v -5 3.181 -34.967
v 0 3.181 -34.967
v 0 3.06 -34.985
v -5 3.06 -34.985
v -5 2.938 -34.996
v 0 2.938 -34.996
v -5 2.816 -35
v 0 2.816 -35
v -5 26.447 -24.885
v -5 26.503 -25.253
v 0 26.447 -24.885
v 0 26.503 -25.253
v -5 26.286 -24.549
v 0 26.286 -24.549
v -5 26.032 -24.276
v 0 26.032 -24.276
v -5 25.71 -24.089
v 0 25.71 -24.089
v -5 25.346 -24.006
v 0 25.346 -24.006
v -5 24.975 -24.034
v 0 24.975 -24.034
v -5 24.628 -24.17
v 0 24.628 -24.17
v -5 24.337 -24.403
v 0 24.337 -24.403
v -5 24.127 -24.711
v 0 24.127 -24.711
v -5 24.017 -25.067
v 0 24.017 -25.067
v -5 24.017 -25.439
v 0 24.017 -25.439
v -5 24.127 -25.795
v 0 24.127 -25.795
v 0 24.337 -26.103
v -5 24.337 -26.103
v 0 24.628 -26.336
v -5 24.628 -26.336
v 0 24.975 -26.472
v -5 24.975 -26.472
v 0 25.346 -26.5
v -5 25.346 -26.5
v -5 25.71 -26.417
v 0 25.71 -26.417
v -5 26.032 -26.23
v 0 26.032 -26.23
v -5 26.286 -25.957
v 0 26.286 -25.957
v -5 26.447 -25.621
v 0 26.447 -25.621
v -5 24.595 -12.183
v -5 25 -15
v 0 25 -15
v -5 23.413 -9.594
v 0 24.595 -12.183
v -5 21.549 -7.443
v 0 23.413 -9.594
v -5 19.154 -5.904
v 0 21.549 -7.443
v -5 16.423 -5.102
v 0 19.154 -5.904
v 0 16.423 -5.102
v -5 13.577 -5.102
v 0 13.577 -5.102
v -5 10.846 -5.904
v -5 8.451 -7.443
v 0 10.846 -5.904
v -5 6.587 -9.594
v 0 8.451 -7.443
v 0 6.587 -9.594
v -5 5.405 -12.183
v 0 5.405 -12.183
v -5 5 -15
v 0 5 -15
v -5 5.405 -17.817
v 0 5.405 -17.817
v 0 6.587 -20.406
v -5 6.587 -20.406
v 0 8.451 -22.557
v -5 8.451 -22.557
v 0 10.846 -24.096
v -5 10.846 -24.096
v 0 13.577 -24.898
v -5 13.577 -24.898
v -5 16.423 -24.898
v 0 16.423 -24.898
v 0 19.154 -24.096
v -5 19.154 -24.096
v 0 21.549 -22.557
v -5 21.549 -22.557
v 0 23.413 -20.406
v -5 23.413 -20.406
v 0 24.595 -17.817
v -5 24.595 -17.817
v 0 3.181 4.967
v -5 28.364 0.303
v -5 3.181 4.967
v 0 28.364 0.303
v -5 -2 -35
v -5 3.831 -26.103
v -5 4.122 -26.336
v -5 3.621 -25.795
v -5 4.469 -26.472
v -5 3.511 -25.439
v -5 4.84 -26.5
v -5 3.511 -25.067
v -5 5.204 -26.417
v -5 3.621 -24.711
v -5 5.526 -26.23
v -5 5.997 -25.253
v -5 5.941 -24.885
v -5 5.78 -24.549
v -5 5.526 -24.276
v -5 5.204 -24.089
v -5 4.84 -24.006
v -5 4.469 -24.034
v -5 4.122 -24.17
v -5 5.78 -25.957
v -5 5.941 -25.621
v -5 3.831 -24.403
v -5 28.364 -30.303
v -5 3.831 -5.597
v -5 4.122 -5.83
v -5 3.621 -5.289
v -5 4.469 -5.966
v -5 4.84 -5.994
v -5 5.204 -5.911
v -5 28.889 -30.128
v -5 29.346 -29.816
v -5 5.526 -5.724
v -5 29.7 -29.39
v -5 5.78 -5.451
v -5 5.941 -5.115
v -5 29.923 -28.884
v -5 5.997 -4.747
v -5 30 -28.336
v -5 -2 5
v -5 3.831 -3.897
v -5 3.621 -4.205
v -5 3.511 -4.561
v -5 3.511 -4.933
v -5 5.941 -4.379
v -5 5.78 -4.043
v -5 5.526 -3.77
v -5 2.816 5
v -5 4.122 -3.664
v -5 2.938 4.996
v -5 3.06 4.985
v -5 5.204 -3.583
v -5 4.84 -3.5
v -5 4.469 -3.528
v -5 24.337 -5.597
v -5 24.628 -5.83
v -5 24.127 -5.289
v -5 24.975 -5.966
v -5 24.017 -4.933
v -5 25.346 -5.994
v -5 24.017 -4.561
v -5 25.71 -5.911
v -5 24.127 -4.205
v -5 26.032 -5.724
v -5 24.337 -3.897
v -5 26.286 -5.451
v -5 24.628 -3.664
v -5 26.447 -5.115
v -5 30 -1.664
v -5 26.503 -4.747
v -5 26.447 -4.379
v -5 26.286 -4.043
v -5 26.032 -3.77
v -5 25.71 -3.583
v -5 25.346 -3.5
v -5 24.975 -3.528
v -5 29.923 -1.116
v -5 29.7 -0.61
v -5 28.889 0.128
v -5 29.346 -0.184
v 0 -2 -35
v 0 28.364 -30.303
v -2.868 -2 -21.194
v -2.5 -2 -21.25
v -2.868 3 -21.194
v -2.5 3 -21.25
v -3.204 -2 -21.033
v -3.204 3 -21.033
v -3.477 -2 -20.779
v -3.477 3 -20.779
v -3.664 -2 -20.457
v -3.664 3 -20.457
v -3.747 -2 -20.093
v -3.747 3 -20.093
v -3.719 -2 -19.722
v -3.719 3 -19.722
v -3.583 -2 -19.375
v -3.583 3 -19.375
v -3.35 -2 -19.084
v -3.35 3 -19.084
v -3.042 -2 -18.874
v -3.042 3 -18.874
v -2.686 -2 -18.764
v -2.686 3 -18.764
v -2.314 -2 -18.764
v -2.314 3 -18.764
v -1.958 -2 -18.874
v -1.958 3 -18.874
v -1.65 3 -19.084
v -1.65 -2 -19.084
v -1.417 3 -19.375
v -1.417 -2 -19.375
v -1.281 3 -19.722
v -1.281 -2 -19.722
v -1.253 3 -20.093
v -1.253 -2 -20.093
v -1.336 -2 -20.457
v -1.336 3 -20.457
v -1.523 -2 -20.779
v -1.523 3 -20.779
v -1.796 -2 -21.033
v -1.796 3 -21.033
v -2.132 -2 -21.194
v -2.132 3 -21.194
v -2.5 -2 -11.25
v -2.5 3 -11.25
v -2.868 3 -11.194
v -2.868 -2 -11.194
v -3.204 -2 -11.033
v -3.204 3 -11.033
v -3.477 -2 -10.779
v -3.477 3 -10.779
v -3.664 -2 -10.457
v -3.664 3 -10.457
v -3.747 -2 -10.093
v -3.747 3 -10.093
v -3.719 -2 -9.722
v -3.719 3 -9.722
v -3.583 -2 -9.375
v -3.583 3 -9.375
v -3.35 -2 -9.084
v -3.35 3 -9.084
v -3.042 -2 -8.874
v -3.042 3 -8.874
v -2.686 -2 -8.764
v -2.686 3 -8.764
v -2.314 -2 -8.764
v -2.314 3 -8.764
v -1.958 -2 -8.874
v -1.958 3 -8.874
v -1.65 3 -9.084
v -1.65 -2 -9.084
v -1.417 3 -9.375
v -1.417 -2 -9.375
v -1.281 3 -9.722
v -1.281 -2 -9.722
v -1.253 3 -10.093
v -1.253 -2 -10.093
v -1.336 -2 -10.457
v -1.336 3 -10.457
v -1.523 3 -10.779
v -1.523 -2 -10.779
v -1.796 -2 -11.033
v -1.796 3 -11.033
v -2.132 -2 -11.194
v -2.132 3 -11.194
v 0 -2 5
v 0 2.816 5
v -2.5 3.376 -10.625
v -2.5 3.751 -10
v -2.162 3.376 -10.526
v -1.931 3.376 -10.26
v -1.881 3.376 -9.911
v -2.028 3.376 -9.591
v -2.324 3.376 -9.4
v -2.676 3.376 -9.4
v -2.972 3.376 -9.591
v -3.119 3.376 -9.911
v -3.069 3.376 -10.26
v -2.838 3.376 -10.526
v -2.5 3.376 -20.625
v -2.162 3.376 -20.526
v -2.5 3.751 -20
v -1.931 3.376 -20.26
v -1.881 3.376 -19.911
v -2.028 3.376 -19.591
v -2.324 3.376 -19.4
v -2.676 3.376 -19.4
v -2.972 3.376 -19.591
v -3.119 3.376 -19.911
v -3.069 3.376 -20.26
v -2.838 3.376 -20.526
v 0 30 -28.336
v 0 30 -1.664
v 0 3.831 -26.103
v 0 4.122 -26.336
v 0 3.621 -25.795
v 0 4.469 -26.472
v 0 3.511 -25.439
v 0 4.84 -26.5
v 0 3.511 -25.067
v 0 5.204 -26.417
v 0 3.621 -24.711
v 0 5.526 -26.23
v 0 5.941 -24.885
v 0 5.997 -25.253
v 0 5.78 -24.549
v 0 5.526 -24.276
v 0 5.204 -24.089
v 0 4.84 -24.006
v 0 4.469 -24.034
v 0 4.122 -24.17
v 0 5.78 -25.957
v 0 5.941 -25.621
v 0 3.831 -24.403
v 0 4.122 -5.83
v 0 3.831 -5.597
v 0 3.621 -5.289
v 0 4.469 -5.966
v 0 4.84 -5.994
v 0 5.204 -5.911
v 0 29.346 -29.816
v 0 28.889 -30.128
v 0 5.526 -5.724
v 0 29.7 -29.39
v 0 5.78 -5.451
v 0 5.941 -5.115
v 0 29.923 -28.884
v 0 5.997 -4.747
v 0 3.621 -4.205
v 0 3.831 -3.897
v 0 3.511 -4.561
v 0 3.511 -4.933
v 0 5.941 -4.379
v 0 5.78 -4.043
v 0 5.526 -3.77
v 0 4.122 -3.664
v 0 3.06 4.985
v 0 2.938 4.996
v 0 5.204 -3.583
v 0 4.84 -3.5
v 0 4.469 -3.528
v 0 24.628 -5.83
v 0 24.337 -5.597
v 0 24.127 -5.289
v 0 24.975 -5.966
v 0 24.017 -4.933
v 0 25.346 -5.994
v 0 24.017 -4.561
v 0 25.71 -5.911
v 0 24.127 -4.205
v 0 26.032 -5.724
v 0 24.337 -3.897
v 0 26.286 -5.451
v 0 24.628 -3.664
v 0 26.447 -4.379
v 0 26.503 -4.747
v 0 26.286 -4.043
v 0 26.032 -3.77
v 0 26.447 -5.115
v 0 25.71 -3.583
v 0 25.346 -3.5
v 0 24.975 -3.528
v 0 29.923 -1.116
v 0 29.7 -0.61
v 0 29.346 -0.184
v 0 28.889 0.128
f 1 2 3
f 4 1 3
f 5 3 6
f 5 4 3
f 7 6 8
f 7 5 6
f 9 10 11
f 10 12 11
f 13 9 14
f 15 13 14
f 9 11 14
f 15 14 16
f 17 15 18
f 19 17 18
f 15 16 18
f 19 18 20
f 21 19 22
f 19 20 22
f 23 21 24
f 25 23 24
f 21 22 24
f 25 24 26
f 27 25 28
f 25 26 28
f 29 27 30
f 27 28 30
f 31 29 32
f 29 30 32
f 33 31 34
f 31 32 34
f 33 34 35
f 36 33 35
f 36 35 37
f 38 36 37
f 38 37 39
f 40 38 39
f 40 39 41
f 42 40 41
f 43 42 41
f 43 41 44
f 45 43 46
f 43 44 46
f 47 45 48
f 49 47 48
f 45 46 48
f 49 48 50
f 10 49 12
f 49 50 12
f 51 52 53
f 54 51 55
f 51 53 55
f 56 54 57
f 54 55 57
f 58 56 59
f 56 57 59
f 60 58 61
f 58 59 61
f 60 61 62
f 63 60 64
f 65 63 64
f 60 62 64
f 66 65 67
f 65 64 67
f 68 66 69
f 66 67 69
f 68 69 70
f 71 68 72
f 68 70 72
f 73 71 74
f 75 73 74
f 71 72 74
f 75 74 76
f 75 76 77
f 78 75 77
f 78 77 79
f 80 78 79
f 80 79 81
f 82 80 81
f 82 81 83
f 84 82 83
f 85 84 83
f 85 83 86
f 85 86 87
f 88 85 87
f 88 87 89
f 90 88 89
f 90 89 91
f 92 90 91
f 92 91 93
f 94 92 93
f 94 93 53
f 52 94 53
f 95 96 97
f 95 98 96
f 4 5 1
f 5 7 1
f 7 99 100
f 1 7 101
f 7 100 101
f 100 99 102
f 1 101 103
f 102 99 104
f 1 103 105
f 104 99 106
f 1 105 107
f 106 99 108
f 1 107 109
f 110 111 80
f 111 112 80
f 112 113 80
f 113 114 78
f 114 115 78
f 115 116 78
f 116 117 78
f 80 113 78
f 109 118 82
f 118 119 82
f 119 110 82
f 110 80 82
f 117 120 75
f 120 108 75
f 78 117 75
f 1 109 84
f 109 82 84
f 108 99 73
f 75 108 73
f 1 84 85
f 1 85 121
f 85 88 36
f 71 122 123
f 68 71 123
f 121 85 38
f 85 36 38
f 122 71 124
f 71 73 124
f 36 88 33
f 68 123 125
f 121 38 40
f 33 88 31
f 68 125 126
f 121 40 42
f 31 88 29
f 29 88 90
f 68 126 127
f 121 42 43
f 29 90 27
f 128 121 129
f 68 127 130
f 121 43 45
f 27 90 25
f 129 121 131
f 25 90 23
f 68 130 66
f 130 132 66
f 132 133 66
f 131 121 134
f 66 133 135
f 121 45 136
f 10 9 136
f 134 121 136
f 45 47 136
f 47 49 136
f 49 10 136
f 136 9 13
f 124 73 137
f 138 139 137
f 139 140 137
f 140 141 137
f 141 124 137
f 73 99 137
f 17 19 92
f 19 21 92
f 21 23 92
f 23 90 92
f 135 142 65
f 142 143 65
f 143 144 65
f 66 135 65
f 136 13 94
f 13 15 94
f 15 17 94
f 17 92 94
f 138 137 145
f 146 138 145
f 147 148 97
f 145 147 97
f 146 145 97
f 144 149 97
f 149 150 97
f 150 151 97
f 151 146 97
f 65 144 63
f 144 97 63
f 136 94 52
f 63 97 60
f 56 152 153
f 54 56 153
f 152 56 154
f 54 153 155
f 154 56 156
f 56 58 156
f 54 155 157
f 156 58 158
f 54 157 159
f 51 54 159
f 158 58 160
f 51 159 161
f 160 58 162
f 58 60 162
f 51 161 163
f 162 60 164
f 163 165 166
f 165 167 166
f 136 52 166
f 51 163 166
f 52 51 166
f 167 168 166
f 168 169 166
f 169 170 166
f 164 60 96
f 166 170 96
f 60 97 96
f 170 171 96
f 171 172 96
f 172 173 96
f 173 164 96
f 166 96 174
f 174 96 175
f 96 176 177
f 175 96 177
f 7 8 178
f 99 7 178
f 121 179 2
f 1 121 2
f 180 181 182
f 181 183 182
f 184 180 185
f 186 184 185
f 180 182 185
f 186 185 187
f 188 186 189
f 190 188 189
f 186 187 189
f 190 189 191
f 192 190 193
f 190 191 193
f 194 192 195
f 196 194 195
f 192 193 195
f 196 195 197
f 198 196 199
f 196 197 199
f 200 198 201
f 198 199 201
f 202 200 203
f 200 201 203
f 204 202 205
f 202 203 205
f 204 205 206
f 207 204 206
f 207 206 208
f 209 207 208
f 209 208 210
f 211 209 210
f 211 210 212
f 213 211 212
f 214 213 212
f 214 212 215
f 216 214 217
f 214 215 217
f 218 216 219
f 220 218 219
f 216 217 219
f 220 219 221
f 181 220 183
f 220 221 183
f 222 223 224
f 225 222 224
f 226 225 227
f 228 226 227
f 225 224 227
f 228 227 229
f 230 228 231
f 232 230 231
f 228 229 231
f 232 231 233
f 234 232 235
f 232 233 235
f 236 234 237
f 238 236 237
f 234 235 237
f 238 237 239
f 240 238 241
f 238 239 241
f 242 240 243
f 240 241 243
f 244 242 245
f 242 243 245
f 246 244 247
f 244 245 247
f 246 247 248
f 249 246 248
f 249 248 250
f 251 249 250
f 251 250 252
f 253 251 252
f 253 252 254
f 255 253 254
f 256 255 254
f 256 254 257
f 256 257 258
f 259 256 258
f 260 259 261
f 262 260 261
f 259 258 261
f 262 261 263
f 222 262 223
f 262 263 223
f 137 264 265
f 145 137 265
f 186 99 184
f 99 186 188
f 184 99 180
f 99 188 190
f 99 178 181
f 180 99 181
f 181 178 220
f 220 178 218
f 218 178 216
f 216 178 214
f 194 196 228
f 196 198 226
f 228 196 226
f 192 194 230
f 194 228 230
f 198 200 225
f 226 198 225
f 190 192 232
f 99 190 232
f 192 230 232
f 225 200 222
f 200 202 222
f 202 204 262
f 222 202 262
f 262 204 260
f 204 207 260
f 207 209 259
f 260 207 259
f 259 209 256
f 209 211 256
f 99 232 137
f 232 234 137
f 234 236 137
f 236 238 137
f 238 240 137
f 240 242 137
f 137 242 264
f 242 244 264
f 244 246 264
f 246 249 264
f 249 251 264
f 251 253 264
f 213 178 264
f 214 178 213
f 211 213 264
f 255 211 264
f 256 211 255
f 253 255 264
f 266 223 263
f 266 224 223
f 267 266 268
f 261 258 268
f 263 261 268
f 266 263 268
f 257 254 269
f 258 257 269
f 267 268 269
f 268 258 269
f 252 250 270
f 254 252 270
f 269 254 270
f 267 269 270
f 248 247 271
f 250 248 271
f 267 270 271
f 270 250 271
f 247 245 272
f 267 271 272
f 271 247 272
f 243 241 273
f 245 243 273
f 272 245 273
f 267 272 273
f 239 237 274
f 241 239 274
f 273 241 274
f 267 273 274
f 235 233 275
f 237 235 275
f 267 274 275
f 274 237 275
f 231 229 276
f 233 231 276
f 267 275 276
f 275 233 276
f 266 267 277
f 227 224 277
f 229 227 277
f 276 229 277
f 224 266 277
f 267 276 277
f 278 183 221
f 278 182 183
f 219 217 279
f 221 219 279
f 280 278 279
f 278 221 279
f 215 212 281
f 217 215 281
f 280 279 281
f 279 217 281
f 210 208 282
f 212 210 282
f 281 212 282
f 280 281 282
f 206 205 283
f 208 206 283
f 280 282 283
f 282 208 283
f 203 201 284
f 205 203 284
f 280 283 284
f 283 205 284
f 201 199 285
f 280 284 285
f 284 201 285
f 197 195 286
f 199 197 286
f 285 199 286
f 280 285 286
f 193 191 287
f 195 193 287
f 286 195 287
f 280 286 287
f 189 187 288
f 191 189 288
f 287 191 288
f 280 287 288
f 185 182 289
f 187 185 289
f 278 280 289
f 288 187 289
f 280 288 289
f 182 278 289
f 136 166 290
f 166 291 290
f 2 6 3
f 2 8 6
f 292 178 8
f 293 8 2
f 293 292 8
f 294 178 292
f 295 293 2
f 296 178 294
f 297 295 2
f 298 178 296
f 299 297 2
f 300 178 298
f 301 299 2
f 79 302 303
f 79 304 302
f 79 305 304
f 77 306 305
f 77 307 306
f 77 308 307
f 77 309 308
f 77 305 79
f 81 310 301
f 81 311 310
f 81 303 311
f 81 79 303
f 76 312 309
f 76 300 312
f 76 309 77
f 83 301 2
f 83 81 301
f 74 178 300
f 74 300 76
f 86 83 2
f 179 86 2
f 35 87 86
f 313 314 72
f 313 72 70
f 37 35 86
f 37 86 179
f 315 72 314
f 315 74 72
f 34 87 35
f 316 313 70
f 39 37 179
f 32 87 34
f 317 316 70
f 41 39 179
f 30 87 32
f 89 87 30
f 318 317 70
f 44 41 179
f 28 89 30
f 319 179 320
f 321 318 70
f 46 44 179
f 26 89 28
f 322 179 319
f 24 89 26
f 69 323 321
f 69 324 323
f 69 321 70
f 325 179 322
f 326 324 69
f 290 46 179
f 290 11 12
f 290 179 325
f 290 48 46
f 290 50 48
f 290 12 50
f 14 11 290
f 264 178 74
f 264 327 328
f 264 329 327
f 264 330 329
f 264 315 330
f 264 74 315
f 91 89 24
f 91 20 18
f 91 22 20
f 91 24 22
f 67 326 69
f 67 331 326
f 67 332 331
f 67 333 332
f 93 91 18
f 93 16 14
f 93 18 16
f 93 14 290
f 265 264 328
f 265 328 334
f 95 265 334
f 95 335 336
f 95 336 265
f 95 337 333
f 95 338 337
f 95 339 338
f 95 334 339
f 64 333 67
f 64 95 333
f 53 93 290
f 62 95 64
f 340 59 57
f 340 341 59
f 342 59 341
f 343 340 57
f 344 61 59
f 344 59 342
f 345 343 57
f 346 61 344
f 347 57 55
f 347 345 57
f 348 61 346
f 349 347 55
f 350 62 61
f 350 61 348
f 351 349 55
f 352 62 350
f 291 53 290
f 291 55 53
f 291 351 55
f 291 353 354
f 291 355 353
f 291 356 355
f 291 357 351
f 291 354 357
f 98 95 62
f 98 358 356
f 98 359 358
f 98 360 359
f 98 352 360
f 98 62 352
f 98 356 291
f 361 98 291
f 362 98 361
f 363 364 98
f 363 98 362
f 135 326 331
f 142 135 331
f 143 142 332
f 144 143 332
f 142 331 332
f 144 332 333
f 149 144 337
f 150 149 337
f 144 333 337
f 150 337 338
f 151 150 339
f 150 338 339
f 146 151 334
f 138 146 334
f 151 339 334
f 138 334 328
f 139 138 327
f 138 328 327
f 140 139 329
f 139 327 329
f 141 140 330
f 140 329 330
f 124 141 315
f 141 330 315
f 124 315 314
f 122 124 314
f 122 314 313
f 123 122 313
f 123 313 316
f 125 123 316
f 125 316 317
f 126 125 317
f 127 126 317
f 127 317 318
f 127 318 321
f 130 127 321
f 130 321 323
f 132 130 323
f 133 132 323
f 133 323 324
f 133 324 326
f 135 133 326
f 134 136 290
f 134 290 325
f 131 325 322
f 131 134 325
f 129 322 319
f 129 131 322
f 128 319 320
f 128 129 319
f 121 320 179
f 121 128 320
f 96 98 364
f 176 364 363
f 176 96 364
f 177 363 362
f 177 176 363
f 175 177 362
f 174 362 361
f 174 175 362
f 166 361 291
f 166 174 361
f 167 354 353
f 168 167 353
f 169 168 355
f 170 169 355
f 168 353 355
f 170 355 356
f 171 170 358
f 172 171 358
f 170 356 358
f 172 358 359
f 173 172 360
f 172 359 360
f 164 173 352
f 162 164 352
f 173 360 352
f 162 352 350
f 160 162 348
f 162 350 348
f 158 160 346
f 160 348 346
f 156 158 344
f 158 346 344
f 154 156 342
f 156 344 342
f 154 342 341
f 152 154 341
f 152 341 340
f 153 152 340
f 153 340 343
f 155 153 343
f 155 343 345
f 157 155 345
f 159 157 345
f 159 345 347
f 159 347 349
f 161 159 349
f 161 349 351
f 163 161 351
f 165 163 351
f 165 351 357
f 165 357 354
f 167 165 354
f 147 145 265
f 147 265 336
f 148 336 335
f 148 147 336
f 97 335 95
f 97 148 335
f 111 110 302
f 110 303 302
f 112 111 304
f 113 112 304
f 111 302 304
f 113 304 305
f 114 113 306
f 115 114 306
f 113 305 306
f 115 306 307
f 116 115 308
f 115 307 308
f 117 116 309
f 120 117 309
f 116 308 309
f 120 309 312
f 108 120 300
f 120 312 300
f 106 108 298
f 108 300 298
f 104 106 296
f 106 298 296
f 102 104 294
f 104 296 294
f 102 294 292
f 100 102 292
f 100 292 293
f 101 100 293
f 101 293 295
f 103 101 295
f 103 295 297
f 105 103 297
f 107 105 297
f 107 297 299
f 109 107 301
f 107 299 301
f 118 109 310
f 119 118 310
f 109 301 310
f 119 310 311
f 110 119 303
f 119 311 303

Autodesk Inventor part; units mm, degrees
ref_plane "YZ Plane" through (0, 0, 0) normal (1, 0, 0) x (0, 1, 0)
ref_plane "XZ Plane" through (0, 0, 0) normal (0, 1, 0) x (-1, 0, 0)
ref_plane "XY Plane" through (0, 0, 0) normal (0, 0, 1) x (1, 0, 0)
sketch "スケッチ1" plane through (0, 0, 0) normal (1, 0, 0) x (0, 1, 0)
  line L0 (0, 0) -> (30, 0)
  line L1 (30, 0) -> (30, -30)
  line L2 (30, -30) -> (0, -30)
  line L3 (0, -30) -> (0, 0)
  circle A0 centre (25.253, -4.747) radius 1.25
  line L4 (15, 0) -> (15, -30)
  line L5 (30, -15) -> (0, -15)
  circle A1 centre (4.747, -4.747) radius 1.25
  circle A2 centre (25.253, -25.253) radius 1.25
  circle A3 centre (4.747, -25.253) radius 1.25
  line L6 (-2, 5) -> (3, 5)
  line L7 (3, 5) -> (3, -35)
  line L8 (3, -35) -> (-2, -35)
  line L9 (-2, -35) -> (-2, 5)
  line L10 (30, 0) -> (3, 5)
  line L11 (30, -30) -> (3, -35)
  circle A4 centre (15, -15) radius 10
  dimension "d0" = 30
  dimension "d1" = 30
  dimension "d2" = 2.5
  dimension "d3" = 4.747
  dimension "d4" = 4.747
  dimension "d5" = 5
  dimension "d6" = 2
  dimension "d7" = 5
  dimension "d8" = 5
  dimension "d12" = 20
extrude "押し出し1" add sketch "スケッチ1" against normal blind 5 contours L0 L7 L10 | L4 A4 L5 L7 L0 | L0 L1 L5 A4 L4 | L7 L5 L3 L0 | L0 L3 L2 L7 L8 L9 L6 | L1 L2 L4 A4 L5 | L7 L2 L3 L5 | L5 A4 L4 L2 L7 | L11 L7 L2
fillet "フィレット1" radius 2 4 edges at (-2.5, 30, 0) (-2.5, 3, 5) (-2.5, 30, -30) (-2.5, 3, -35)
sketch "スケッチ2" plane through (0, -2, -35) normal (0, -1, 0) x (1, 0, 0)
  line L0 (0, 0) -> (-5, 0) projected
  line L1 (-2.5, 0) -> (-2.5, 40)
  line L2 (0, 40) -> (-5, 40) projected
  point P0 (0, 35)
  point P1 (-2.5, 15)
  point P2 (-2.5, 25)
  dimension "d13" = 15
  dimension "d14" = 10
hole "穴1" at (-2.5, -2, -20) at (-2.5, -2, -10) direction (0, 1, 0) diameter 2.5 depth 5 tip angle 118
equation "\"d4\" = d3"
properties part number "belt_liner_v5_Plate_12" material "アルミニウム 6061"
